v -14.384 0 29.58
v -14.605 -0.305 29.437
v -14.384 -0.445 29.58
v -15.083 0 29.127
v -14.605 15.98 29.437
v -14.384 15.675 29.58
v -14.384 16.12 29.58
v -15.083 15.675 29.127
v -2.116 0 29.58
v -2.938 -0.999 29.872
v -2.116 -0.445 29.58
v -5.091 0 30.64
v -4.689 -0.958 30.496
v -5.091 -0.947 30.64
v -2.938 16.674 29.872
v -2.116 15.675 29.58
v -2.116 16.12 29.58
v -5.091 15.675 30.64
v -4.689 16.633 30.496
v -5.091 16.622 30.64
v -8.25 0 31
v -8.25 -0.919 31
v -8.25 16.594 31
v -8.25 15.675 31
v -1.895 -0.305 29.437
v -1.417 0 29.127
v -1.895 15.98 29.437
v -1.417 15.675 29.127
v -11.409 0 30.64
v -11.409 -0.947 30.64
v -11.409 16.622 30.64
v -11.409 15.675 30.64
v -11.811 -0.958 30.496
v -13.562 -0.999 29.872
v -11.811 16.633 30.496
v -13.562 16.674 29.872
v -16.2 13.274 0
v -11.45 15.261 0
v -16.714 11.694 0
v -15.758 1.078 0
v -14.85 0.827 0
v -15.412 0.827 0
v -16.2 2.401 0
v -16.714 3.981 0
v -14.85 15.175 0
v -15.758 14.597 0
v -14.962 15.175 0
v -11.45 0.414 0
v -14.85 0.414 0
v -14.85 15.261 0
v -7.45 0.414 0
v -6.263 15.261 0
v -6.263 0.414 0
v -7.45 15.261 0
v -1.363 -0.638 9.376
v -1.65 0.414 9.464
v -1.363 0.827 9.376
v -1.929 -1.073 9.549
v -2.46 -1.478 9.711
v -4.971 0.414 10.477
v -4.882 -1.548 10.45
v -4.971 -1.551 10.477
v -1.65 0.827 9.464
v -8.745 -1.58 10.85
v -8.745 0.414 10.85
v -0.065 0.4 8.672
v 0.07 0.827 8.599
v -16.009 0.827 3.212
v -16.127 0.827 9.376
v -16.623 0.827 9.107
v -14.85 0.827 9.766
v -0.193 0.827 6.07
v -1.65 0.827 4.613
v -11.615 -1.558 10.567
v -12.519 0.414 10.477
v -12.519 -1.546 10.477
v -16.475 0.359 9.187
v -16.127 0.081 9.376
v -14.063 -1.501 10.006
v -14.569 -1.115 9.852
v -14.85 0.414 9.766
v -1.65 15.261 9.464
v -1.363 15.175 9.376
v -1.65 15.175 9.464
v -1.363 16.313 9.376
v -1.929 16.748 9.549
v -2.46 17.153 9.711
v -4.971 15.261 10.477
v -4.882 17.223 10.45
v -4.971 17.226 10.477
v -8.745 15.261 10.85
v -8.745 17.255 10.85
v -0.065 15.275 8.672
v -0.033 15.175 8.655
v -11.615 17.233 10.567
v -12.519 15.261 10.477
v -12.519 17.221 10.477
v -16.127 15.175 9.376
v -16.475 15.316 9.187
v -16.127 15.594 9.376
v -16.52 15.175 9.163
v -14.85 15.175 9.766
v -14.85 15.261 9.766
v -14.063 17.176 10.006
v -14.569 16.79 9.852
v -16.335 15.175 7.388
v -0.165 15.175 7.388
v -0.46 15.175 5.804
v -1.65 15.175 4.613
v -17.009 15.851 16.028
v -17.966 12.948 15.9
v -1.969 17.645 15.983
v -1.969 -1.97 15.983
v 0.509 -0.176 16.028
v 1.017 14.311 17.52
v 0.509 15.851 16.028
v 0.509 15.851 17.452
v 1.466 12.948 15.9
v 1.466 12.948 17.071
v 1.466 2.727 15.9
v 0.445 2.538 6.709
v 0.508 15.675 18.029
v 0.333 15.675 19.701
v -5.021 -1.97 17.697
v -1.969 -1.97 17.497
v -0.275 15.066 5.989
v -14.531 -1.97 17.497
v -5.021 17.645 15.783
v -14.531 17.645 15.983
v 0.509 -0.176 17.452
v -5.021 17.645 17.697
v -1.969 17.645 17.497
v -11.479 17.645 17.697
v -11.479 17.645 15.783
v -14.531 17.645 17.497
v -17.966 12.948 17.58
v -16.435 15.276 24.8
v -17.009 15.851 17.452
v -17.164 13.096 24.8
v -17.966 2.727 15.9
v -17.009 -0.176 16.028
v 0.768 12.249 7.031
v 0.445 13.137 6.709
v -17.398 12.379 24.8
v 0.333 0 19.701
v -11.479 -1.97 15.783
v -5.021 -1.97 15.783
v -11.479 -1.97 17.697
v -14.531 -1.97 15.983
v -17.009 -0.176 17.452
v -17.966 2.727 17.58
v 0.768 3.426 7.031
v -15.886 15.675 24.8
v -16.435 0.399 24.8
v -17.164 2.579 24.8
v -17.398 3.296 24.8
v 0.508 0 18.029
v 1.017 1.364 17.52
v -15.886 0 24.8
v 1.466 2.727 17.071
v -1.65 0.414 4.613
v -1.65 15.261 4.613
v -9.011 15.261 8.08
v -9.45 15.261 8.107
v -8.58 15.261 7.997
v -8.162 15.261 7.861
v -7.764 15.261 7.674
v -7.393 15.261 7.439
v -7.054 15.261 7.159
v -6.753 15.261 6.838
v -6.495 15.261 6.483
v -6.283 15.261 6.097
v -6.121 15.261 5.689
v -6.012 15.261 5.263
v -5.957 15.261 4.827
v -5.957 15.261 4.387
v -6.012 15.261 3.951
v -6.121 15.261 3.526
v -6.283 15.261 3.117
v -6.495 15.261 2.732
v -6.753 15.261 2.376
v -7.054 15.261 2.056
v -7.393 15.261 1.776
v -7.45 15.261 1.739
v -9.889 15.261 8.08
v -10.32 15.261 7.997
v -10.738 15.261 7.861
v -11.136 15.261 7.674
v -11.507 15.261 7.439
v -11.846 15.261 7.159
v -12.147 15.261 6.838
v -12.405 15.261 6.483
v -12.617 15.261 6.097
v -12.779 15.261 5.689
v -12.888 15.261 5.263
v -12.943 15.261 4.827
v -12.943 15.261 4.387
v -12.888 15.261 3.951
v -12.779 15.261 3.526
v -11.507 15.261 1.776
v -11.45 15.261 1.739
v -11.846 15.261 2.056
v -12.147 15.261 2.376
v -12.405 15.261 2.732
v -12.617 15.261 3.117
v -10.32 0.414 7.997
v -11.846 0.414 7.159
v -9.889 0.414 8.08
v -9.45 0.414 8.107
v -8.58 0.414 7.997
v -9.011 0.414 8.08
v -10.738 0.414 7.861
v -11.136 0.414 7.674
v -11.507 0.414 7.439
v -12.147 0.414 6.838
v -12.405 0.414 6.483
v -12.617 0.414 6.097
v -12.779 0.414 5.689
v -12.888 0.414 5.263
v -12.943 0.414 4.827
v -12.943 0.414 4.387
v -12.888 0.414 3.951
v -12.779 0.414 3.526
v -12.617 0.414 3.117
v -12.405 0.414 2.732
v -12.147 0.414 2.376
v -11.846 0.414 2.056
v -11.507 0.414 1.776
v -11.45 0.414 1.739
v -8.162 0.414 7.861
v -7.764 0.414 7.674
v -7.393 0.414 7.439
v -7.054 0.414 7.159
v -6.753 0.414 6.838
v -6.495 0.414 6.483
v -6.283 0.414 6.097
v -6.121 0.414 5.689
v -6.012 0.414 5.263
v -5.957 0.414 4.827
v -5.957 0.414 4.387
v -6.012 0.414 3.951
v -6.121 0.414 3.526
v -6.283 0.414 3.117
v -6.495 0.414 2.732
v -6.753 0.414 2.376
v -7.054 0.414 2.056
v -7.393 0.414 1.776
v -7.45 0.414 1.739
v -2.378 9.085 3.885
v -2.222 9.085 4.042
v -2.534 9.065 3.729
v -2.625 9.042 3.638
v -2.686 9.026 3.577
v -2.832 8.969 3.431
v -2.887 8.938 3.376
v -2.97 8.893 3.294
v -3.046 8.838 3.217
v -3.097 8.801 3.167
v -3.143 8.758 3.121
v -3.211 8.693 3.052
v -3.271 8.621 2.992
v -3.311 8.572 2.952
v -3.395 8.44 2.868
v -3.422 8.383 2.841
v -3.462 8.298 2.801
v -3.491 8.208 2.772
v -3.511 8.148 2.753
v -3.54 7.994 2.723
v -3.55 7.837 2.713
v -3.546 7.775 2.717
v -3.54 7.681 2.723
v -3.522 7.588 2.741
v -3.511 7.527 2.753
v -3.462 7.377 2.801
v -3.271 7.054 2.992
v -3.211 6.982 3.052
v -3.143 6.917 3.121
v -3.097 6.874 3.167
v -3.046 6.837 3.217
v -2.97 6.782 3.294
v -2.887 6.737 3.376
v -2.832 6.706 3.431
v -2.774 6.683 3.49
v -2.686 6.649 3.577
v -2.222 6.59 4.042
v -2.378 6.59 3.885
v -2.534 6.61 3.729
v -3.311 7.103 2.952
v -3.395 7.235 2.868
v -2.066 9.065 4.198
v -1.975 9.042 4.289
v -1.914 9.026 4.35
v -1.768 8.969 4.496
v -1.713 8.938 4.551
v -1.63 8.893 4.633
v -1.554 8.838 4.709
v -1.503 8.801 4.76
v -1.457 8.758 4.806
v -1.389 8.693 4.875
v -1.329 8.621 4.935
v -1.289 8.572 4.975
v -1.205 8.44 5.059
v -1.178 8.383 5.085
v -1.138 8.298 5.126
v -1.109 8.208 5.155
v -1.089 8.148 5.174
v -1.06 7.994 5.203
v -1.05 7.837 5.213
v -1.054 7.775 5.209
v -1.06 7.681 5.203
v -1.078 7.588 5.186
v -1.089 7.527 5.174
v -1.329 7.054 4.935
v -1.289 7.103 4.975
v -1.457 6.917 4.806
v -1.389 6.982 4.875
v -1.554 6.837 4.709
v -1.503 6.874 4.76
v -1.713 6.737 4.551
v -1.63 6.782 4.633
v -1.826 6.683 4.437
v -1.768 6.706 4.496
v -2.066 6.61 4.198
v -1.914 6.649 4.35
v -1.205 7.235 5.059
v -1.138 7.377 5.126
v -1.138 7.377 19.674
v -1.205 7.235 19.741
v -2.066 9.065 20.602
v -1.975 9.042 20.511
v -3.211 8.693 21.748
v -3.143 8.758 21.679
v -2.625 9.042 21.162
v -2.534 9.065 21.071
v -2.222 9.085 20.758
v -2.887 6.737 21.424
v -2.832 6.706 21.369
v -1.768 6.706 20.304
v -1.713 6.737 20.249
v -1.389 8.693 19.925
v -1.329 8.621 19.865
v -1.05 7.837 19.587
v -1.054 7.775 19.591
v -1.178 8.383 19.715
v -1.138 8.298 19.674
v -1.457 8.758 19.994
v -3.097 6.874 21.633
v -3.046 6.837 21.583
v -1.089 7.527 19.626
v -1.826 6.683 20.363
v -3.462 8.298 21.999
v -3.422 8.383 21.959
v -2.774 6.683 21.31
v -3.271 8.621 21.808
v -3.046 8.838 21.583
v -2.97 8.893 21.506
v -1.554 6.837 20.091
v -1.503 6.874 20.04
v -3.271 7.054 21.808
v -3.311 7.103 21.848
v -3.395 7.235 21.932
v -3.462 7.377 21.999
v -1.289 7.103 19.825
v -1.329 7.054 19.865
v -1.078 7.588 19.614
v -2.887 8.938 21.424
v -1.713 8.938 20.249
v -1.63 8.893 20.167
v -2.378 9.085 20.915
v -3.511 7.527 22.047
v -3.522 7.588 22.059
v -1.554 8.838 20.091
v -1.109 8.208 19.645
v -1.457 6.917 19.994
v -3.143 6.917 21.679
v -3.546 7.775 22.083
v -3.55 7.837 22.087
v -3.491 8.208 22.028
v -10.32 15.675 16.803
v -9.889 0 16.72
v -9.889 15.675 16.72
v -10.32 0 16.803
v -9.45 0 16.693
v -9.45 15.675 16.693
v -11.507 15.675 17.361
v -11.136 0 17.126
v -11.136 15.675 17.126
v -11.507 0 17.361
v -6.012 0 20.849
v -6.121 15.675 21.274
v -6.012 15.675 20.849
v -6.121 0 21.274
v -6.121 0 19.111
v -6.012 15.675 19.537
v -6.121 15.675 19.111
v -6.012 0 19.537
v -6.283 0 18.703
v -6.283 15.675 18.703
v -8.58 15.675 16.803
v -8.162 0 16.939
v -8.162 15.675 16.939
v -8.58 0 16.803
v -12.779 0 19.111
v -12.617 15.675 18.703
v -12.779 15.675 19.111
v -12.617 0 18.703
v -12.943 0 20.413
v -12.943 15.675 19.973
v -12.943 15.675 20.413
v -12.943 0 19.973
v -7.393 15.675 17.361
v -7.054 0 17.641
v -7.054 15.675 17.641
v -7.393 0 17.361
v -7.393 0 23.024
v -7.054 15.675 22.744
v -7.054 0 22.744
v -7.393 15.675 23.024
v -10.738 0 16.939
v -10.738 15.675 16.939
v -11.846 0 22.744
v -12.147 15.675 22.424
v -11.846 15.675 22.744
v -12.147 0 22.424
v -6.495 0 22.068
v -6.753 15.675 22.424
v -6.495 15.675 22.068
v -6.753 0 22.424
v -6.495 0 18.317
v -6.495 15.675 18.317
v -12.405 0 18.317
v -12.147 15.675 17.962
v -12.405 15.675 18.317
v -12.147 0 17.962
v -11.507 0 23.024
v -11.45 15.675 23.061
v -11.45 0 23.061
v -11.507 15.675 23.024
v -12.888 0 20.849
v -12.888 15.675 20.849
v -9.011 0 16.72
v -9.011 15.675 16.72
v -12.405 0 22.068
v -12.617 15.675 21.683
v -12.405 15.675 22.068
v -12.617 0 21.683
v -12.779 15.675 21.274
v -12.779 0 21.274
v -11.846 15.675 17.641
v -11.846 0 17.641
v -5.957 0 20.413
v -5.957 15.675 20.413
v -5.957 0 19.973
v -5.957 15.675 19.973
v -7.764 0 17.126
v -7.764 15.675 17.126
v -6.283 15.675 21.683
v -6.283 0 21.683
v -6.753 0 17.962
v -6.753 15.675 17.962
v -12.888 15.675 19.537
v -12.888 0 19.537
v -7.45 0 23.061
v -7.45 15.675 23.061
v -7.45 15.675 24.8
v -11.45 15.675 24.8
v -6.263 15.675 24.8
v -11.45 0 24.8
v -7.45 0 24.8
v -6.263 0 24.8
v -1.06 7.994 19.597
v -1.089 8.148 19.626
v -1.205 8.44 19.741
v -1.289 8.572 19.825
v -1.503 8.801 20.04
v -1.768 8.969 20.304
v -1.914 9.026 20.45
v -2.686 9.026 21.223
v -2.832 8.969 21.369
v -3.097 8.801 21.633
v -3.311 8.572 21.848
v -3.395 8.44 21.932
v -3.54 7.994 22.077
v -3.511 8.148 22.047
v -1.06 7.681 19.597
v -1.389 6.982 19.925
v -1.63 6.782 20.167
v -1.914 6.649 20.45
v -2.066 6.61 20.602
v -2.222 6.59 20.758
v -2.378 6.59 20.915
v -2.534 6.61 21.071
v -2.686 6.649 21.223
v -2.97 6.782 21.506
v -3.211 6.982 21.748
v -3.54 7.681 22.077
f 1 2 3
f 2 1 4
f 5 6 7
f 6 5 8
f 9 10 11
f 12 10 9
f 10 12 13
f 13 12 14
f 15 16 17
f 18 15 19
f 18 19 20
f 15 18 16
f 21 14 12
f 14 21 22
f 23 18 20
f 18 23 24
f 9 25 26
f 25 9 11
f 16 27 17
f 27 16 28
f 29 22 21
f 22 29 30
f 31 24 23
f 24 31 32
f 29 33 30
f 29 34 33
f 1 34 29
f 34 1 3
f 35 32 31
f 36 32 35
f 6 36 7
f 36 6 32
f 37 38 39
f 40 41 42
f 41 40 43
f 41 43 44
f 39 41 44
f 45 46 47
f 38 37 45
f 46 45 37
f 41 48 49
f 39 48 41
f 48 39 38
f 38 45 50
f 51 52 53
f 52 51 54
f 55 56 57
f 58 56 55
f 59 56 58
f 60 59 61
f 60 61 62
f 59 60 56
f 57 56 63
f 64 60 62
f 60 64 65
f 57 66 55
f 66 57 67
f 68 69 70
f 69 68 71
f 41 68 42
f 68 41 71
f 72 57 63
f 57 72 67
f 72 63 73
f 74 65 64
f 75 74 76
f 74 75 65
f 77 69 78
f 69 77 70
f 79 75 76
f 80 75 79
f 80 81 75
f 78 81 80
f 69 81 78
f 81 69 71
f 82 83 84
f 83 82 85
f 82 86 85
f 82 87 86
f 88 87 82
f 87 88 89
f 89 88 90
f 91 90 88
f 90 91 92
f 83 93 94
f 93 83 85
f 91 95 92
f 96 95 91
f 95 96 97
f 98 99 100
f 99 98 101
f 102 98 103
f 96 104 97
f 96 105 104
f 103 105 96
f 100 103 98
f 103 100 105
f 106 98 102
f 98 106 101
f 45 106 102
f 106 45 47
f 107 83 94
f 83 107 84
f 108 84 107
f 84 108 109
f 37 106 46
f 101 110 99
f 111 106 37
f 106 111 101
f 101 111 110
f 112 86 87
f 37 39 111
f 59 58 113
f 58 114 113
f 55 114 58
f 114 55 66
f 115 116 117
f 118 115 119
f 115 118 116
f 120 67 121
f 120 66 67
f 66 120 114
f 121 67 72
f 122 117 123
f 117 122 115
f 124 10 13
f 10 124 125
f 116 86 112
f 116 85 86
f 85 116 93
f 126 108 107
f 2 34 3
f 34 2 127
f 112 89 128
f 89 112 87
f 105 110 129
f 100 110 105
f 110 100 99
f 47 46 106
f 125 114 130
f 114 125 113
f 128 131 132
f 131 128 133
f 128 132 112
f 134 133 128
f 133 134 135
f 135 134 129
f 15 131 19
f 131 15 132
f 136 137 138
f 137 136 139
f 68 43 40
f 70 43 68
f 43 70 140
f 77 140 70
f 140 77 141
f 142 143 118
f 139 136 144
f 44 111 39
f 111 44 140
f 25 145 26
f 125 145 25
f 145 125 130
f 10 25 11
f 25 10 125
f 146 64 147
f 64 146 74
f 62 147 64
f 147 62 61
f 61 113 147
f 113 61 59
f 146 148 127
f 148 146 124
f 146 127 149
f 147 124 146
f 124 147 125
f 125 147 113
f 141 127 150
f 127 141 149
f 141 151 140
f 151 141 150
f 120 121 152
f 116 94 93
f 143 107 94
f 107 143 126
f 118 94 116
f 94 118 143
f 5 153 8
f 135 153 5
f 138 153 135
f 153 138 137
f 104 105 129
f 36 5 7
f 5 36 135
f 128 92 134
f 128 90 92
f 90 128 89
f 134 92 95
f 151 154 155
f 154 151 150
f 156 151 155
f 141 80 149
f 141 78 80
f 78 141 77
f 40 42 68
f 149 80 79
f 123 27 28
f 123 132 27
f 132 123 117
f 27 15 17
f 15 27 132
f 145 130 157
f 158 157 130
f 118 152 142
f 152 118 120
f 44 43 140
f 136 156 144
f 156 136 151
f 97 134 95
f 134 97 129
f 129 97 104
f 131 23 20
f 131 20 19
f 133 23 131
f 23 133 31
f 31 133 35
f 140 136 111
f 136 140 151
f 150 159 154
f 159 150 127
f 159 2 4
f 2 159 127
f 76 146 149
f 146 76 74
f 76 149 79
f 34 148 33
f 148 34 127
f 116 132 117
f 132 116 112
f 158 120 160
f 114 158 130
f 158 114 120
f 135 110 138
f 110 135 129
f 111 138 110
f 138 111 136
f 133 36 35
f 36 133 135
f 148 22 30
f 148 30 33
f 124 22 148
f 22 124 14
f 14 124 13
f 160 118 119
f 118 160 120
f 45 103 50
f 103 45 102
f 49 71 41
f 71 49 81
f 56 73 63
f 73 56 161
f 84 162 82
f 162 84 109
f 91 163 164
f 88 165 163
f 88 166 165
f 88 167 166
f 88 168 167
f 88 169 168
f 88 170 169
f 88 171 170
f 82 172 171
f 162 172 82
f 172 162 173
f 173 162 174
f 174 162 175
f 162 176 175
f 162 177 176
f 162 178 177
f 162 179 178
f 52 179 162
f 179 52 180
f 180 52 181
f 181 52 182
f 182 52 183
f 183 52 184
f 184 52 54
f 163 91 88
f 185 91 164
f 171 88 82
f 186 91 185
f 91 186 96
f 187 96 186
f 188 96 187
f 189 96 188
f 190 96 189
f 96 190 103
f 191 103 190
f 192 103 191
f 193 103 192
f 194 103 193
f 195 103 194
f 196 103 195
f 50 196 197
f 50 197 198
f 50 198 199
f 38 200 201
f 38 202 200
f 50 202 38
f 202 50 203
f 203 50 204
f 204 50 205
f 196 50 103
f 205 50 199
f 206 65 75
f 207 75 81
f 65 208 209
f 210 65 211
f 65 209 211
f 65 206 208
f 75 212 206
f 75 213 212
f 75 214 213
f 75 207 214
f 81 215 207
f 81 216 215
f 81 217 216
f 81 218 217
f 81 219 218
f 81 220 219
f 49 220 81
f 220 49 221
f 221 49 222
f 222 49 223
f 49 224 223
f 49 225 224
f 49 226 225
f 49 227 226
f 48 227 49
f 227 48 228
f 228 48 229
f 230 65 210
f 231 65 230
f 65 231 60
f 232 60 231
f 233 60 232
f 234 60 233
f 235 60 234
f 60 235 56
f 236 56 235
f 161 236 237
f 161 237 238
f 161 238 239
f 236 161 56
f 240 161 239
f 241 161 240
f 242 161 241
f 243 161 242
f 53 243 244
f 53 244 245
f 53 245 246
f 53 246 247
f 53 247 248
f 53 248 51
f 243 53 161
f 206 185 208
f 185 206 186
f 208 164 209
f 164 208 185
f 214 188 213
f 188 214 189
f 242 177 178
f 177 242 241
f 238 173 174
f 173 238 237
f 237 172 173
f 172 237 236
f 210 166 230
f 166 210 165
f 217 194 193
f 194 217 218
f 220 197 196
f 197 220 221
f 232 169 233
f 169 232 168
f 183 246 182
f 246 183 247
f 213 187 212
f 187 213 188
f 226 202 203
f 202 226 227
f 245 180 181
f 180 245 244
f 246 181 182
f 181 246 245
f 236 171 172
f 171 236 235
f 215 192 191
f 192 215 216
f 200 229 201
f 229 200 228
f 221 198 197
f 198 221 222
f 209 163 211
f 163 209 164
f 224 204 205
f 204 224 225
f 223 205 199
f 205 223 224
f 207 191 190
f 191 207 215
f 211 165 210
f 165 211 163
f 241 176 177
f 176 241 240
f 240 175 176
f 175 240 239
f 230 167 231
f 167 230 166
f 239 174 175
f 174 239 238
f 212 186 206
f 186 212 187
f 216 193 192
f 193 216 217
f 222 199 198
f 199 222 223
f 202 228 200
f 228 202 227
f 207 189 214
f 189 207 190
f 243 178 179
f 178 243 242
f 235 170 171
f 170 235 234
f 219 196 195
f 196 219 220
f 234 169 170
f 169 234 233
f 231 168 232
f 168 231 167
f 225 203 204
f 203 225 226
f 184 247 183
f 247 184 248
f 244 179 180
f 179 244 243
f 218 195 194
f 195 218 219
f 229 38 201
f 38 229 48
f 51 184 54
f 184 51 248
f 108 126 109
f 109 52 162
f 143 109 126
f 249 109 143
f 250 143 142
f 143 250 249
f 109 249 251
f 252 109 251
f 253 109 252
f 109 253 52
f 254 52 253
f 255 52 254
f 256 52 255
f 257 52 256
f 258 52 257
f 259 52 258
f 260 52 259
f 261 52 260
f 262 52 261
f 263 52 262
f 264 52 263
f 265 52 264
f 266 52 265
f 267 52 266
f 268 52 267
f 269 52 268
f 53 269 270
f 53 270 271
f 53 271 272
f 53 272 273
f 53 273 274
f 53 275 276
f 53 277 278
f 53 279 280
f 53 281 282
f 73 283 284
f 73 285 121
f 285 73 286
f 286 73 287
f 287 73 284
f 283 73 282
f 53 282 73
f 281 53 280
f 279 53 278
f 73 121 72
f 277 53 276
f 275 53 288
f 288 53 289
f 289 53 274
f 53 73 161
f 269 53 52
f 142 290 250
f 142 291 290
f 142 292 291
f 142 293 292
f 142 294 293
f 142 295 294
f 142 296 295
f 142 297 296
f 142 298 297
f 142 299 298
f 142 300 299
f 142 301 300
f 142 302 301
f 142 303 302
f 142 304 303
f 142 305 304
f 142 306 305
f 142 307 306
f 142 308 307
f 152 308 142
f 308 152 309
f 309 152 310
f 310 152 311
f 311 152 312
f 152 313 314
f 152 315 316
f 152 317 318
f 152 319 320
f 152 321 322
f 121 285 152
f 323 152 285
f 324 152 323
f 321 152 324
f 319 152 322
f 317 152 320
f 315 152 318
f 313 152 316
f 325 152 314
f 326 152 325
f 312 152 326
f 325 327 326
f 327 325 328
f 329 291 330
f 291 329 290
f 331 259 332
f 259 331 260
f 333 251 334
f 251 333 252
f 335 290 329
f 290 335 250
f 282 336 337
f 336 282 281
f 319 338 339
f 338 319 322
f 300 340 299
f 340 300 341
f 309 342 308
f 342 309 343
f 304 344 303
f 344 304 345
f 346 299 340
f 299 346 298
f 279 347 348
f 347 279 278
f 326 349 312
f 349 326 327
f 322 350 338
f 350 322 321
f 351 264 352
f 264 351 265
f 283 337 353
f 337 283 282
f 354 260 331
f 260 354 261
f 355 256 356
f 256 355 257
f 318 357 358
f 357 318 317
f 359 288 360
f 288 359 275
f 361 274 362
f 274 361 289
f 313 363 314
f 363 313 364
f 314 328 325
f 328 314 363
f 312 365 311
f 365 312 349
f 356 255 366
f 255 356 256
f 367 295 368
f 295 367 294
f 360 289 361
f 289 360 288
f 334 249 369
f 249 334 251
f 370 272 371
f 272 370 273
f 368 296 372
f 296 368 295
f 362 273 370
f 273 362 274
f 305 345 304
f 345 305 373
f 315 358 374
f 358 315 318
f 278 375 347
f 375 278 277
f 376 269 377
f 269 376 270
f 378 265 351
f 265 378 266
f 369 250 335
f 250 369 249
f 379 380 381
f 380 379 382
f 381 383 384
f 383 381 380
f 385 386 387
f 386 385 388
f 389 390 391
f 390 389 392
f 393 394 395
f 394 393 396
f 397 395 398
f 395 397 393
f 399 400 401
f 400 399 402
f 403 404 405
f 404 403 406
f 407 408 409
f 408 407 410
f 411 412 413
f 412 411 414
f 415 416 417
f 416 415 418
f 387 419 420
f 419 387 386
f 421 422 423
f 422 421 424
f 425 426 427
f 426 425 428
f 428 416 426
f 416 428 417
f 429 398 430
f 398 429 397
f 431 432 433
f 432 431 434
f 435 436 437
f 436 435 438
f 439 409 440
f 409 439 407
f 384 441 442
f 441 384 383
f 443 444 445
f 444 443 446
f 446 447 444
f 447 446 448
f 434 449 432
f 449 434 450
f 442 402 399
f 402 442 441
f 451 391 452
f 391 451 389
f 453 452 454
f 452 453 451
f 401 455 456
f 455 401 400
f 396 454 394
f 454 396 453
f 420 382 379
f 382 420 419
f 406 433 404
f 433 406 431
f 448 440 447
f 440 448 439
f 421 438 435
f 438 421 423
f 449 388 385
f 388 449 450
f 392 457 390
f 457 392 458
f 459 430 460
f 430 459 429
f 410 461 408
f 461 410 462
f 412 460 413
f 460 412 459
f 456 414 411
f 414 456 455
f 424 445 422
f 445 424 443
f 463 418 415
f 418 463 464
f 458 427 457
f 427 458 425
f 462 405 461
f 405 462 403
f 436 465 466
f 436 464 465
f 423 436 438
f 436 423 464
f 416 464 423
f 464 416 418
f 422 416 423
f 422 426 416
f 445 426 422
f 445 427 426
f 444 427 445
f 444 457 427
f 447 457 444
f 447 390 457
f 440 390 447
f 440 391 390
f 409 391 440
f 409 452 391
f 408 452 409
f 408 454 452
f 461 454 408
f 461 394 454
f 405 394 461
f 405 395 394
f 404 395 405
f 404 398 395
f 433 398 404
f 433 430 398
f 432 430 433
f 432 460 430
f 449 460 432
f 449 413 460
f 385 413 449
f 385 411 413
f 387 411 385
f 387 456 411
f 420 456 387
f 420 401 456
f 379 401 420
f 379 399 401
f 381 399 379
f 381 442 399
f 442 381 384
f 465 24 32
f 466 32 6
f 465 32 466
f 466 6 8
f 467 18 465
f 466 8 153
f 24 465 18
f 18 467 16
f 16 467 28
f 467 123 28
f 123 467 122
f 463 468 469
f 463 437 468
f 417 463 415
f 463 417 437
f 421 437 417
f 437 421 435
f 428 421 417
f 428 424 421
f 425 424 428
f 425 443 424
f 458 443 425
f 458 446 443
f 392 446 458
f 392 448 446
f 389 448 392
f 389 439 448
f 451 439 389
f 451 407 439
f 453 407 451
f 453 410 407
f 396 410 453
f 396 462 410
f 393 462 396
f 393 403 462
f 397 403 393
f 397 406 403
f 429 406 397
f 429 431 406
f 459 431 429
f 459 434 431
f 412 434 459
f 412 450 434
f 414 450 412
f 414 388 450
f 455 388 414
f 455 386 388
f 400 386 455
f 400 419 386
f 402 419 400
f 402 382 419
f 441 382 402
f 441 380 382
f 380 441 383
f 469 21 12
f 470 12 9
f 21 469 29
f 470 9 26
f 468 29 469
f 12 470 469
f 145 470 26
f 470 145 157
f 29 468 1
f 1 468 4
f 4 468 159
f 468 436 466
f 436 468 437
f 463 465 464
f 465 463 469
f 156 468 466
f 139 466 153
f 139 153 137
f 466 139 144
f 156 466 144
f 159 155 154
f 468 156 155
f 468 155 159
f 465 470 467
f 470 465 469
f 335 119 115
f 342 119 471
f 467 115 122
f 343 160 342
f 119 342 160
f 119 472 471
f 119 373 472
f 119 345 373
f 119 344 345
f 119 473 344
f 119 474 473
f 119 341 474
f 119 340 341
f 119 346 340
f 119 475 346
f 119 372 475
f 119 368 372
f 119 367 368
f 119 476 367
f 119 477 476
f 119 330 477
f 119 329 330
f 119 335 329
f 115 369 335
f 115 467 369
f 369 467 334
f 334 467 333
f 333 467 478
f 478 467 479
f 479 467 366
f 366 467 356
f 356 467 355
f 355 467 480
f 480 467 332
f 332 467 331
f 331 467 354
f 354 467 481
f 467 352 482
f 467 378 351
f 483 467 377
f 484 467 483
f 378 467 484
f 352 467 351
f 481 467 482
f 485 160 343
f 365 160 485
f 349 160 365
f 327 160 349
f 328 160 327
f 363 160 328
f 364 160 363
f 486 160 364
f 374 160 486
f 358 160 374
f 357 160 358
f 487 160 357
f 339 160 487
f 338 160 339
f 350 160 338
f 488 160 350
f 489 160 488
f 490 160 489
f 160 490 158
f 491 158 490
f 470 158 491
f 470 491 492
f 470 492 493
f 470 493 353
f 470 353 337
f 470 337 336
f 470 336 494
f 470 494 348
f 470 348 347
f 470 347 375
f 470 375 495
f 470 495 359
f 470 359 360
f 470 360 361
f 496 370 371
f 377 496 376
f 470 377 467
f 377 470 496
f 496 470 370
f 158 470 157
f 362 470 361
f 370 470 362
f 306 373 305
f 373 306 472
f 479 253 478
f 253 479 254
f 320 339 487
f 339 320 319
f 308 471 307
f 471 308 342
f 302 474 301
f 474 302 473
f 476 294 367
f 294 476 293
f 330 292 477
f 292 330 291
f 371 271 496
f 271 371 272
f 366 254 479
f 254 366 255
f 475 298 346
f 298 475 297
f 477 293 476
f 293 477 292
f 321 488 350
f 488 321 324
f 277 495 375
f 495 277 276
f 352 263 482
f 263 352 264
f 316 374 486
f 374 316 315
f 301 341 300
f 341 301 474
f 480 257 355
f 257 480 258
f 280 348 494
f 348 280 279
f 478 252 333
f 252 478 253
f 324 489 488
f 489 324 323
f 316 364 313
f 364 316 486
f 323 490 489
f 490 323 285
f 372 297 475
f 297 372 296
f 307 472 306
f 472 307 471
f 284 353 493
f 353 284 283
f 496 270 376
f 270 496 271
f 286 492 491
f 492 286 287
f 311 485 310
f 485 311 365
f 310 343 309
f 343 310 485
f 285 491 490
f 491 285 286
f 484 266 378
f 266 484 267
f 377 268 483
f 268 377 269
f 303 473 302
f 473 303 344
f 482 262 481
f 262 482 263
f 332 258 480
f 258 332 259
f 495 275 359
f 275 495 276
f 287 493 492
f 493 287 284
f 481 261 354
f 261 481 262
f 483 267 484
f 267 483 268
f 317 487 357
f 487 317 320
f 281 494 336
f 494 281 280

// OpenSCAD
// file: util/finger_base.scad
include <../../config.scad>

rotate([0,-90,0]) fingerbase();

//	Base segment of finger, can be lengthened
module fingerbase(length=20, proximalHole=true, distalHole=true)
{
	difference() {
		scale([yScaleFactor,xScaleFactor,zScaleFactor]) {
			fingerbasesolid(length);
		}
		if(proximalHole) {
			translate([0,knucklePadding/2 * xScaleFactor,0]) fingerhardwarecutouts(jointDia, jointThick, knuckleW=knuckleW-knucklePadding, fingerLen=length);
		}
		if (distalHole) {
			translate([length * yScaleFactor,0,0]) mirror([1,0,0]) fingerhardwarecutouts(jointDia, jointThick, knuckleW=knuckleW, fingerLen=length);
		}
	}


	
}

module fingerhardwarecutouts(jointDia,jointThick,knuckleW,fingerLen,holeCutoff=100) {
	//slot for flex joint
	translate([7 - (15/jointDia),0,6*zScaleFactor - (1.8/jointThick)]) {
		rotate([90,0,0]) translate([-0.25,0,-knuckleW*xScaleFactor]) cylinder(d=jointDia, h=knuckleW*xScaleFactor, $fn=50);
		translate([-25,(knuckleW*xScaleFactor) / 2,0]) cube([50,knuckleW*xScaleFactor,jointThick], center=true);
	}
	//cubic parts
	translate([-100,0,0]) cube([100,knuckleW*xScaleFactor,100]);
	translate([-13/zScaleFactor,0,0]) rotate([0,45,0]) translate([-50,0,0]) cube([100,knuckleW * xScaleFactor, 10]);

	//channel for string/tendon
	translate([-fingerLen/2 * yScaleFactor, knuckleW/2 * xScaleFactor, 2.3]) rotate([0,90,0]) cylinder(d=2.5, h=holeCutoff, $fn=50);
}

//	base segment of finger, solid
module fingerbasesolid(length=50, cutout=true) {
	difference() {
		//cubic part
		translate([0,0.001 + knucklePadding/2,1]) cube([length, knuckleW - knucklePadding - 0.002, 8]);
	}
	
	//cylindrical-ish part around finger
	intersection() {
		//overly large shape to get the cross section in the XZ plane from
		difference() {
			union() {
				translate([length-4,-5,5]) rotate([-90,0,0]) cylinder(r=8,h=knuckleW + 10);
				translate([0,-5,-5]) cube([length,knuckleW + 10,20]);
			}
			//cutout for the side "guards" of the previous knuckle
			if(cutout) {
				translate([-4,-knuckleW+0.001,5.3]) rotate([-90,0,0]) cylinder(r=11,h=10);
				translate([-4,knuckleW - knucklePadding*(1/xScaleFactor),5.3]) rotate([-90,0,0]) cylinder(r=11,h=10);
			}
		}

		hull() {
			for(i=[-1,1], j=[-1,1]) {
				//angled cylinders to provide the outer shape of the finger
				translate([length/10,i*2.4 + knuckleW/2,j*2.2 + 5]) rotate([i*j*-4,j*86,0]) cylinder(d=6,h=20,center=true);
				translate([length+4, i*2.4 + knuckleW/2, j*2.2 + 5]) rotate([i*j*-4,j*-86,0]) cylinder(d=6,h=20,center=true);
			}
		}
	}
}
// file: ../config.scad
/**
 * Configuration settings for Flexy Beast, required to generate correctly sized STLs of the printed parts. See the Configuration File Assembly instructions to set this up.
 * @id config_file
 * @name Configuration File
 * @category Prerequisites!
 * @step Open config.scad in your favorite text editor.
 * @step As per the normal Cyborg Beast instructions, measure the width of the knuckles in the non-affected hand and convert to millimeters.
 * @step Add 5 to that result and then divide by 55.
 * @step Replace the x-, y-, and zScaleFactor variables in config.scad with that number.
 * @step If desired, adjust the proportions of the hand by changing those variables individually. xScaleFactor controls the width of the hand, yScaleFactor controls the length, and zScaleFactor controls the height.
 * @step Open assembly.scad in OpenSCAD to check that the flexy joint holes are not too large for the hand (should only be necessary for small children). If necessary, reduce the jointDia and jointThick variables. jointDia=5 and jointThick=2 is a good amount for smaller hands.
 * @step Set the fingerPads variable to true or false depending on whether you want to cast silicone finger pads for improved grip.
 * @step Open palm.scad, finger_base.scad, finger_tip.scad, and thumb_tip.scad in OpenSCAD, render each part (F6), and export as STL, then print. Suggested print settings are 0.2mm or smaller layer height, 3 perimeters, and 25% rectilinear or hexagonal infill.
 */

knuckleR = 4.85;
knucklePadding = 0.5;
knuckleW = 9.5;
wristH = 10;
palmH = 20;
palmW = 64;
th = 3;
fn = 32;

//flexy joint parameters
jointDia = 7;
jointThick = 4;

//finger settings
fingerPads = true; //whether or not to hollow the finger tips slightly for molding pads
fingerLength = 1; //multiply the length of all fingers by this amount
thumbProp = 0.8; //proportion of thumb length relative to other fingers (note that the thumb is a segment shorter than the other fingers already)
indexProp = 0.8; //proportion of index finger length relative to other fingers
middleProp = 1; //proportion of middle finger length relative to other fingers
ringProp = 0.8; //proportion of ring finger length relative to other fingers
pinkyProp = 0.7; //proportion of pinky finger length relative to other fingers

//misc settings
thermoform = true; //whether or not to generate a thermoformable mesh for the palm

//desired scale factor for hand based on the standard Cyborg Beast/Robohand sizing guide
xScaleFactor = 1.65; // [1.05:1.60]
yScaleFactor = 1.55; // [1.05:1.60]
zScaleFactor = 1.65; // [1.05:1.60]
// main file
include <../config.scad>
use <util/finger_base.scad>

rotate([0,-90,0]) fingerbase(length = 20 * ringProp * fingerLength);

/**
 * Proximal phalanx for ring finger - rendered from parts/finger_ring_base.scad
 * @id ring_base
 * @name Ring Finger Base
 * @category Printed
 */
